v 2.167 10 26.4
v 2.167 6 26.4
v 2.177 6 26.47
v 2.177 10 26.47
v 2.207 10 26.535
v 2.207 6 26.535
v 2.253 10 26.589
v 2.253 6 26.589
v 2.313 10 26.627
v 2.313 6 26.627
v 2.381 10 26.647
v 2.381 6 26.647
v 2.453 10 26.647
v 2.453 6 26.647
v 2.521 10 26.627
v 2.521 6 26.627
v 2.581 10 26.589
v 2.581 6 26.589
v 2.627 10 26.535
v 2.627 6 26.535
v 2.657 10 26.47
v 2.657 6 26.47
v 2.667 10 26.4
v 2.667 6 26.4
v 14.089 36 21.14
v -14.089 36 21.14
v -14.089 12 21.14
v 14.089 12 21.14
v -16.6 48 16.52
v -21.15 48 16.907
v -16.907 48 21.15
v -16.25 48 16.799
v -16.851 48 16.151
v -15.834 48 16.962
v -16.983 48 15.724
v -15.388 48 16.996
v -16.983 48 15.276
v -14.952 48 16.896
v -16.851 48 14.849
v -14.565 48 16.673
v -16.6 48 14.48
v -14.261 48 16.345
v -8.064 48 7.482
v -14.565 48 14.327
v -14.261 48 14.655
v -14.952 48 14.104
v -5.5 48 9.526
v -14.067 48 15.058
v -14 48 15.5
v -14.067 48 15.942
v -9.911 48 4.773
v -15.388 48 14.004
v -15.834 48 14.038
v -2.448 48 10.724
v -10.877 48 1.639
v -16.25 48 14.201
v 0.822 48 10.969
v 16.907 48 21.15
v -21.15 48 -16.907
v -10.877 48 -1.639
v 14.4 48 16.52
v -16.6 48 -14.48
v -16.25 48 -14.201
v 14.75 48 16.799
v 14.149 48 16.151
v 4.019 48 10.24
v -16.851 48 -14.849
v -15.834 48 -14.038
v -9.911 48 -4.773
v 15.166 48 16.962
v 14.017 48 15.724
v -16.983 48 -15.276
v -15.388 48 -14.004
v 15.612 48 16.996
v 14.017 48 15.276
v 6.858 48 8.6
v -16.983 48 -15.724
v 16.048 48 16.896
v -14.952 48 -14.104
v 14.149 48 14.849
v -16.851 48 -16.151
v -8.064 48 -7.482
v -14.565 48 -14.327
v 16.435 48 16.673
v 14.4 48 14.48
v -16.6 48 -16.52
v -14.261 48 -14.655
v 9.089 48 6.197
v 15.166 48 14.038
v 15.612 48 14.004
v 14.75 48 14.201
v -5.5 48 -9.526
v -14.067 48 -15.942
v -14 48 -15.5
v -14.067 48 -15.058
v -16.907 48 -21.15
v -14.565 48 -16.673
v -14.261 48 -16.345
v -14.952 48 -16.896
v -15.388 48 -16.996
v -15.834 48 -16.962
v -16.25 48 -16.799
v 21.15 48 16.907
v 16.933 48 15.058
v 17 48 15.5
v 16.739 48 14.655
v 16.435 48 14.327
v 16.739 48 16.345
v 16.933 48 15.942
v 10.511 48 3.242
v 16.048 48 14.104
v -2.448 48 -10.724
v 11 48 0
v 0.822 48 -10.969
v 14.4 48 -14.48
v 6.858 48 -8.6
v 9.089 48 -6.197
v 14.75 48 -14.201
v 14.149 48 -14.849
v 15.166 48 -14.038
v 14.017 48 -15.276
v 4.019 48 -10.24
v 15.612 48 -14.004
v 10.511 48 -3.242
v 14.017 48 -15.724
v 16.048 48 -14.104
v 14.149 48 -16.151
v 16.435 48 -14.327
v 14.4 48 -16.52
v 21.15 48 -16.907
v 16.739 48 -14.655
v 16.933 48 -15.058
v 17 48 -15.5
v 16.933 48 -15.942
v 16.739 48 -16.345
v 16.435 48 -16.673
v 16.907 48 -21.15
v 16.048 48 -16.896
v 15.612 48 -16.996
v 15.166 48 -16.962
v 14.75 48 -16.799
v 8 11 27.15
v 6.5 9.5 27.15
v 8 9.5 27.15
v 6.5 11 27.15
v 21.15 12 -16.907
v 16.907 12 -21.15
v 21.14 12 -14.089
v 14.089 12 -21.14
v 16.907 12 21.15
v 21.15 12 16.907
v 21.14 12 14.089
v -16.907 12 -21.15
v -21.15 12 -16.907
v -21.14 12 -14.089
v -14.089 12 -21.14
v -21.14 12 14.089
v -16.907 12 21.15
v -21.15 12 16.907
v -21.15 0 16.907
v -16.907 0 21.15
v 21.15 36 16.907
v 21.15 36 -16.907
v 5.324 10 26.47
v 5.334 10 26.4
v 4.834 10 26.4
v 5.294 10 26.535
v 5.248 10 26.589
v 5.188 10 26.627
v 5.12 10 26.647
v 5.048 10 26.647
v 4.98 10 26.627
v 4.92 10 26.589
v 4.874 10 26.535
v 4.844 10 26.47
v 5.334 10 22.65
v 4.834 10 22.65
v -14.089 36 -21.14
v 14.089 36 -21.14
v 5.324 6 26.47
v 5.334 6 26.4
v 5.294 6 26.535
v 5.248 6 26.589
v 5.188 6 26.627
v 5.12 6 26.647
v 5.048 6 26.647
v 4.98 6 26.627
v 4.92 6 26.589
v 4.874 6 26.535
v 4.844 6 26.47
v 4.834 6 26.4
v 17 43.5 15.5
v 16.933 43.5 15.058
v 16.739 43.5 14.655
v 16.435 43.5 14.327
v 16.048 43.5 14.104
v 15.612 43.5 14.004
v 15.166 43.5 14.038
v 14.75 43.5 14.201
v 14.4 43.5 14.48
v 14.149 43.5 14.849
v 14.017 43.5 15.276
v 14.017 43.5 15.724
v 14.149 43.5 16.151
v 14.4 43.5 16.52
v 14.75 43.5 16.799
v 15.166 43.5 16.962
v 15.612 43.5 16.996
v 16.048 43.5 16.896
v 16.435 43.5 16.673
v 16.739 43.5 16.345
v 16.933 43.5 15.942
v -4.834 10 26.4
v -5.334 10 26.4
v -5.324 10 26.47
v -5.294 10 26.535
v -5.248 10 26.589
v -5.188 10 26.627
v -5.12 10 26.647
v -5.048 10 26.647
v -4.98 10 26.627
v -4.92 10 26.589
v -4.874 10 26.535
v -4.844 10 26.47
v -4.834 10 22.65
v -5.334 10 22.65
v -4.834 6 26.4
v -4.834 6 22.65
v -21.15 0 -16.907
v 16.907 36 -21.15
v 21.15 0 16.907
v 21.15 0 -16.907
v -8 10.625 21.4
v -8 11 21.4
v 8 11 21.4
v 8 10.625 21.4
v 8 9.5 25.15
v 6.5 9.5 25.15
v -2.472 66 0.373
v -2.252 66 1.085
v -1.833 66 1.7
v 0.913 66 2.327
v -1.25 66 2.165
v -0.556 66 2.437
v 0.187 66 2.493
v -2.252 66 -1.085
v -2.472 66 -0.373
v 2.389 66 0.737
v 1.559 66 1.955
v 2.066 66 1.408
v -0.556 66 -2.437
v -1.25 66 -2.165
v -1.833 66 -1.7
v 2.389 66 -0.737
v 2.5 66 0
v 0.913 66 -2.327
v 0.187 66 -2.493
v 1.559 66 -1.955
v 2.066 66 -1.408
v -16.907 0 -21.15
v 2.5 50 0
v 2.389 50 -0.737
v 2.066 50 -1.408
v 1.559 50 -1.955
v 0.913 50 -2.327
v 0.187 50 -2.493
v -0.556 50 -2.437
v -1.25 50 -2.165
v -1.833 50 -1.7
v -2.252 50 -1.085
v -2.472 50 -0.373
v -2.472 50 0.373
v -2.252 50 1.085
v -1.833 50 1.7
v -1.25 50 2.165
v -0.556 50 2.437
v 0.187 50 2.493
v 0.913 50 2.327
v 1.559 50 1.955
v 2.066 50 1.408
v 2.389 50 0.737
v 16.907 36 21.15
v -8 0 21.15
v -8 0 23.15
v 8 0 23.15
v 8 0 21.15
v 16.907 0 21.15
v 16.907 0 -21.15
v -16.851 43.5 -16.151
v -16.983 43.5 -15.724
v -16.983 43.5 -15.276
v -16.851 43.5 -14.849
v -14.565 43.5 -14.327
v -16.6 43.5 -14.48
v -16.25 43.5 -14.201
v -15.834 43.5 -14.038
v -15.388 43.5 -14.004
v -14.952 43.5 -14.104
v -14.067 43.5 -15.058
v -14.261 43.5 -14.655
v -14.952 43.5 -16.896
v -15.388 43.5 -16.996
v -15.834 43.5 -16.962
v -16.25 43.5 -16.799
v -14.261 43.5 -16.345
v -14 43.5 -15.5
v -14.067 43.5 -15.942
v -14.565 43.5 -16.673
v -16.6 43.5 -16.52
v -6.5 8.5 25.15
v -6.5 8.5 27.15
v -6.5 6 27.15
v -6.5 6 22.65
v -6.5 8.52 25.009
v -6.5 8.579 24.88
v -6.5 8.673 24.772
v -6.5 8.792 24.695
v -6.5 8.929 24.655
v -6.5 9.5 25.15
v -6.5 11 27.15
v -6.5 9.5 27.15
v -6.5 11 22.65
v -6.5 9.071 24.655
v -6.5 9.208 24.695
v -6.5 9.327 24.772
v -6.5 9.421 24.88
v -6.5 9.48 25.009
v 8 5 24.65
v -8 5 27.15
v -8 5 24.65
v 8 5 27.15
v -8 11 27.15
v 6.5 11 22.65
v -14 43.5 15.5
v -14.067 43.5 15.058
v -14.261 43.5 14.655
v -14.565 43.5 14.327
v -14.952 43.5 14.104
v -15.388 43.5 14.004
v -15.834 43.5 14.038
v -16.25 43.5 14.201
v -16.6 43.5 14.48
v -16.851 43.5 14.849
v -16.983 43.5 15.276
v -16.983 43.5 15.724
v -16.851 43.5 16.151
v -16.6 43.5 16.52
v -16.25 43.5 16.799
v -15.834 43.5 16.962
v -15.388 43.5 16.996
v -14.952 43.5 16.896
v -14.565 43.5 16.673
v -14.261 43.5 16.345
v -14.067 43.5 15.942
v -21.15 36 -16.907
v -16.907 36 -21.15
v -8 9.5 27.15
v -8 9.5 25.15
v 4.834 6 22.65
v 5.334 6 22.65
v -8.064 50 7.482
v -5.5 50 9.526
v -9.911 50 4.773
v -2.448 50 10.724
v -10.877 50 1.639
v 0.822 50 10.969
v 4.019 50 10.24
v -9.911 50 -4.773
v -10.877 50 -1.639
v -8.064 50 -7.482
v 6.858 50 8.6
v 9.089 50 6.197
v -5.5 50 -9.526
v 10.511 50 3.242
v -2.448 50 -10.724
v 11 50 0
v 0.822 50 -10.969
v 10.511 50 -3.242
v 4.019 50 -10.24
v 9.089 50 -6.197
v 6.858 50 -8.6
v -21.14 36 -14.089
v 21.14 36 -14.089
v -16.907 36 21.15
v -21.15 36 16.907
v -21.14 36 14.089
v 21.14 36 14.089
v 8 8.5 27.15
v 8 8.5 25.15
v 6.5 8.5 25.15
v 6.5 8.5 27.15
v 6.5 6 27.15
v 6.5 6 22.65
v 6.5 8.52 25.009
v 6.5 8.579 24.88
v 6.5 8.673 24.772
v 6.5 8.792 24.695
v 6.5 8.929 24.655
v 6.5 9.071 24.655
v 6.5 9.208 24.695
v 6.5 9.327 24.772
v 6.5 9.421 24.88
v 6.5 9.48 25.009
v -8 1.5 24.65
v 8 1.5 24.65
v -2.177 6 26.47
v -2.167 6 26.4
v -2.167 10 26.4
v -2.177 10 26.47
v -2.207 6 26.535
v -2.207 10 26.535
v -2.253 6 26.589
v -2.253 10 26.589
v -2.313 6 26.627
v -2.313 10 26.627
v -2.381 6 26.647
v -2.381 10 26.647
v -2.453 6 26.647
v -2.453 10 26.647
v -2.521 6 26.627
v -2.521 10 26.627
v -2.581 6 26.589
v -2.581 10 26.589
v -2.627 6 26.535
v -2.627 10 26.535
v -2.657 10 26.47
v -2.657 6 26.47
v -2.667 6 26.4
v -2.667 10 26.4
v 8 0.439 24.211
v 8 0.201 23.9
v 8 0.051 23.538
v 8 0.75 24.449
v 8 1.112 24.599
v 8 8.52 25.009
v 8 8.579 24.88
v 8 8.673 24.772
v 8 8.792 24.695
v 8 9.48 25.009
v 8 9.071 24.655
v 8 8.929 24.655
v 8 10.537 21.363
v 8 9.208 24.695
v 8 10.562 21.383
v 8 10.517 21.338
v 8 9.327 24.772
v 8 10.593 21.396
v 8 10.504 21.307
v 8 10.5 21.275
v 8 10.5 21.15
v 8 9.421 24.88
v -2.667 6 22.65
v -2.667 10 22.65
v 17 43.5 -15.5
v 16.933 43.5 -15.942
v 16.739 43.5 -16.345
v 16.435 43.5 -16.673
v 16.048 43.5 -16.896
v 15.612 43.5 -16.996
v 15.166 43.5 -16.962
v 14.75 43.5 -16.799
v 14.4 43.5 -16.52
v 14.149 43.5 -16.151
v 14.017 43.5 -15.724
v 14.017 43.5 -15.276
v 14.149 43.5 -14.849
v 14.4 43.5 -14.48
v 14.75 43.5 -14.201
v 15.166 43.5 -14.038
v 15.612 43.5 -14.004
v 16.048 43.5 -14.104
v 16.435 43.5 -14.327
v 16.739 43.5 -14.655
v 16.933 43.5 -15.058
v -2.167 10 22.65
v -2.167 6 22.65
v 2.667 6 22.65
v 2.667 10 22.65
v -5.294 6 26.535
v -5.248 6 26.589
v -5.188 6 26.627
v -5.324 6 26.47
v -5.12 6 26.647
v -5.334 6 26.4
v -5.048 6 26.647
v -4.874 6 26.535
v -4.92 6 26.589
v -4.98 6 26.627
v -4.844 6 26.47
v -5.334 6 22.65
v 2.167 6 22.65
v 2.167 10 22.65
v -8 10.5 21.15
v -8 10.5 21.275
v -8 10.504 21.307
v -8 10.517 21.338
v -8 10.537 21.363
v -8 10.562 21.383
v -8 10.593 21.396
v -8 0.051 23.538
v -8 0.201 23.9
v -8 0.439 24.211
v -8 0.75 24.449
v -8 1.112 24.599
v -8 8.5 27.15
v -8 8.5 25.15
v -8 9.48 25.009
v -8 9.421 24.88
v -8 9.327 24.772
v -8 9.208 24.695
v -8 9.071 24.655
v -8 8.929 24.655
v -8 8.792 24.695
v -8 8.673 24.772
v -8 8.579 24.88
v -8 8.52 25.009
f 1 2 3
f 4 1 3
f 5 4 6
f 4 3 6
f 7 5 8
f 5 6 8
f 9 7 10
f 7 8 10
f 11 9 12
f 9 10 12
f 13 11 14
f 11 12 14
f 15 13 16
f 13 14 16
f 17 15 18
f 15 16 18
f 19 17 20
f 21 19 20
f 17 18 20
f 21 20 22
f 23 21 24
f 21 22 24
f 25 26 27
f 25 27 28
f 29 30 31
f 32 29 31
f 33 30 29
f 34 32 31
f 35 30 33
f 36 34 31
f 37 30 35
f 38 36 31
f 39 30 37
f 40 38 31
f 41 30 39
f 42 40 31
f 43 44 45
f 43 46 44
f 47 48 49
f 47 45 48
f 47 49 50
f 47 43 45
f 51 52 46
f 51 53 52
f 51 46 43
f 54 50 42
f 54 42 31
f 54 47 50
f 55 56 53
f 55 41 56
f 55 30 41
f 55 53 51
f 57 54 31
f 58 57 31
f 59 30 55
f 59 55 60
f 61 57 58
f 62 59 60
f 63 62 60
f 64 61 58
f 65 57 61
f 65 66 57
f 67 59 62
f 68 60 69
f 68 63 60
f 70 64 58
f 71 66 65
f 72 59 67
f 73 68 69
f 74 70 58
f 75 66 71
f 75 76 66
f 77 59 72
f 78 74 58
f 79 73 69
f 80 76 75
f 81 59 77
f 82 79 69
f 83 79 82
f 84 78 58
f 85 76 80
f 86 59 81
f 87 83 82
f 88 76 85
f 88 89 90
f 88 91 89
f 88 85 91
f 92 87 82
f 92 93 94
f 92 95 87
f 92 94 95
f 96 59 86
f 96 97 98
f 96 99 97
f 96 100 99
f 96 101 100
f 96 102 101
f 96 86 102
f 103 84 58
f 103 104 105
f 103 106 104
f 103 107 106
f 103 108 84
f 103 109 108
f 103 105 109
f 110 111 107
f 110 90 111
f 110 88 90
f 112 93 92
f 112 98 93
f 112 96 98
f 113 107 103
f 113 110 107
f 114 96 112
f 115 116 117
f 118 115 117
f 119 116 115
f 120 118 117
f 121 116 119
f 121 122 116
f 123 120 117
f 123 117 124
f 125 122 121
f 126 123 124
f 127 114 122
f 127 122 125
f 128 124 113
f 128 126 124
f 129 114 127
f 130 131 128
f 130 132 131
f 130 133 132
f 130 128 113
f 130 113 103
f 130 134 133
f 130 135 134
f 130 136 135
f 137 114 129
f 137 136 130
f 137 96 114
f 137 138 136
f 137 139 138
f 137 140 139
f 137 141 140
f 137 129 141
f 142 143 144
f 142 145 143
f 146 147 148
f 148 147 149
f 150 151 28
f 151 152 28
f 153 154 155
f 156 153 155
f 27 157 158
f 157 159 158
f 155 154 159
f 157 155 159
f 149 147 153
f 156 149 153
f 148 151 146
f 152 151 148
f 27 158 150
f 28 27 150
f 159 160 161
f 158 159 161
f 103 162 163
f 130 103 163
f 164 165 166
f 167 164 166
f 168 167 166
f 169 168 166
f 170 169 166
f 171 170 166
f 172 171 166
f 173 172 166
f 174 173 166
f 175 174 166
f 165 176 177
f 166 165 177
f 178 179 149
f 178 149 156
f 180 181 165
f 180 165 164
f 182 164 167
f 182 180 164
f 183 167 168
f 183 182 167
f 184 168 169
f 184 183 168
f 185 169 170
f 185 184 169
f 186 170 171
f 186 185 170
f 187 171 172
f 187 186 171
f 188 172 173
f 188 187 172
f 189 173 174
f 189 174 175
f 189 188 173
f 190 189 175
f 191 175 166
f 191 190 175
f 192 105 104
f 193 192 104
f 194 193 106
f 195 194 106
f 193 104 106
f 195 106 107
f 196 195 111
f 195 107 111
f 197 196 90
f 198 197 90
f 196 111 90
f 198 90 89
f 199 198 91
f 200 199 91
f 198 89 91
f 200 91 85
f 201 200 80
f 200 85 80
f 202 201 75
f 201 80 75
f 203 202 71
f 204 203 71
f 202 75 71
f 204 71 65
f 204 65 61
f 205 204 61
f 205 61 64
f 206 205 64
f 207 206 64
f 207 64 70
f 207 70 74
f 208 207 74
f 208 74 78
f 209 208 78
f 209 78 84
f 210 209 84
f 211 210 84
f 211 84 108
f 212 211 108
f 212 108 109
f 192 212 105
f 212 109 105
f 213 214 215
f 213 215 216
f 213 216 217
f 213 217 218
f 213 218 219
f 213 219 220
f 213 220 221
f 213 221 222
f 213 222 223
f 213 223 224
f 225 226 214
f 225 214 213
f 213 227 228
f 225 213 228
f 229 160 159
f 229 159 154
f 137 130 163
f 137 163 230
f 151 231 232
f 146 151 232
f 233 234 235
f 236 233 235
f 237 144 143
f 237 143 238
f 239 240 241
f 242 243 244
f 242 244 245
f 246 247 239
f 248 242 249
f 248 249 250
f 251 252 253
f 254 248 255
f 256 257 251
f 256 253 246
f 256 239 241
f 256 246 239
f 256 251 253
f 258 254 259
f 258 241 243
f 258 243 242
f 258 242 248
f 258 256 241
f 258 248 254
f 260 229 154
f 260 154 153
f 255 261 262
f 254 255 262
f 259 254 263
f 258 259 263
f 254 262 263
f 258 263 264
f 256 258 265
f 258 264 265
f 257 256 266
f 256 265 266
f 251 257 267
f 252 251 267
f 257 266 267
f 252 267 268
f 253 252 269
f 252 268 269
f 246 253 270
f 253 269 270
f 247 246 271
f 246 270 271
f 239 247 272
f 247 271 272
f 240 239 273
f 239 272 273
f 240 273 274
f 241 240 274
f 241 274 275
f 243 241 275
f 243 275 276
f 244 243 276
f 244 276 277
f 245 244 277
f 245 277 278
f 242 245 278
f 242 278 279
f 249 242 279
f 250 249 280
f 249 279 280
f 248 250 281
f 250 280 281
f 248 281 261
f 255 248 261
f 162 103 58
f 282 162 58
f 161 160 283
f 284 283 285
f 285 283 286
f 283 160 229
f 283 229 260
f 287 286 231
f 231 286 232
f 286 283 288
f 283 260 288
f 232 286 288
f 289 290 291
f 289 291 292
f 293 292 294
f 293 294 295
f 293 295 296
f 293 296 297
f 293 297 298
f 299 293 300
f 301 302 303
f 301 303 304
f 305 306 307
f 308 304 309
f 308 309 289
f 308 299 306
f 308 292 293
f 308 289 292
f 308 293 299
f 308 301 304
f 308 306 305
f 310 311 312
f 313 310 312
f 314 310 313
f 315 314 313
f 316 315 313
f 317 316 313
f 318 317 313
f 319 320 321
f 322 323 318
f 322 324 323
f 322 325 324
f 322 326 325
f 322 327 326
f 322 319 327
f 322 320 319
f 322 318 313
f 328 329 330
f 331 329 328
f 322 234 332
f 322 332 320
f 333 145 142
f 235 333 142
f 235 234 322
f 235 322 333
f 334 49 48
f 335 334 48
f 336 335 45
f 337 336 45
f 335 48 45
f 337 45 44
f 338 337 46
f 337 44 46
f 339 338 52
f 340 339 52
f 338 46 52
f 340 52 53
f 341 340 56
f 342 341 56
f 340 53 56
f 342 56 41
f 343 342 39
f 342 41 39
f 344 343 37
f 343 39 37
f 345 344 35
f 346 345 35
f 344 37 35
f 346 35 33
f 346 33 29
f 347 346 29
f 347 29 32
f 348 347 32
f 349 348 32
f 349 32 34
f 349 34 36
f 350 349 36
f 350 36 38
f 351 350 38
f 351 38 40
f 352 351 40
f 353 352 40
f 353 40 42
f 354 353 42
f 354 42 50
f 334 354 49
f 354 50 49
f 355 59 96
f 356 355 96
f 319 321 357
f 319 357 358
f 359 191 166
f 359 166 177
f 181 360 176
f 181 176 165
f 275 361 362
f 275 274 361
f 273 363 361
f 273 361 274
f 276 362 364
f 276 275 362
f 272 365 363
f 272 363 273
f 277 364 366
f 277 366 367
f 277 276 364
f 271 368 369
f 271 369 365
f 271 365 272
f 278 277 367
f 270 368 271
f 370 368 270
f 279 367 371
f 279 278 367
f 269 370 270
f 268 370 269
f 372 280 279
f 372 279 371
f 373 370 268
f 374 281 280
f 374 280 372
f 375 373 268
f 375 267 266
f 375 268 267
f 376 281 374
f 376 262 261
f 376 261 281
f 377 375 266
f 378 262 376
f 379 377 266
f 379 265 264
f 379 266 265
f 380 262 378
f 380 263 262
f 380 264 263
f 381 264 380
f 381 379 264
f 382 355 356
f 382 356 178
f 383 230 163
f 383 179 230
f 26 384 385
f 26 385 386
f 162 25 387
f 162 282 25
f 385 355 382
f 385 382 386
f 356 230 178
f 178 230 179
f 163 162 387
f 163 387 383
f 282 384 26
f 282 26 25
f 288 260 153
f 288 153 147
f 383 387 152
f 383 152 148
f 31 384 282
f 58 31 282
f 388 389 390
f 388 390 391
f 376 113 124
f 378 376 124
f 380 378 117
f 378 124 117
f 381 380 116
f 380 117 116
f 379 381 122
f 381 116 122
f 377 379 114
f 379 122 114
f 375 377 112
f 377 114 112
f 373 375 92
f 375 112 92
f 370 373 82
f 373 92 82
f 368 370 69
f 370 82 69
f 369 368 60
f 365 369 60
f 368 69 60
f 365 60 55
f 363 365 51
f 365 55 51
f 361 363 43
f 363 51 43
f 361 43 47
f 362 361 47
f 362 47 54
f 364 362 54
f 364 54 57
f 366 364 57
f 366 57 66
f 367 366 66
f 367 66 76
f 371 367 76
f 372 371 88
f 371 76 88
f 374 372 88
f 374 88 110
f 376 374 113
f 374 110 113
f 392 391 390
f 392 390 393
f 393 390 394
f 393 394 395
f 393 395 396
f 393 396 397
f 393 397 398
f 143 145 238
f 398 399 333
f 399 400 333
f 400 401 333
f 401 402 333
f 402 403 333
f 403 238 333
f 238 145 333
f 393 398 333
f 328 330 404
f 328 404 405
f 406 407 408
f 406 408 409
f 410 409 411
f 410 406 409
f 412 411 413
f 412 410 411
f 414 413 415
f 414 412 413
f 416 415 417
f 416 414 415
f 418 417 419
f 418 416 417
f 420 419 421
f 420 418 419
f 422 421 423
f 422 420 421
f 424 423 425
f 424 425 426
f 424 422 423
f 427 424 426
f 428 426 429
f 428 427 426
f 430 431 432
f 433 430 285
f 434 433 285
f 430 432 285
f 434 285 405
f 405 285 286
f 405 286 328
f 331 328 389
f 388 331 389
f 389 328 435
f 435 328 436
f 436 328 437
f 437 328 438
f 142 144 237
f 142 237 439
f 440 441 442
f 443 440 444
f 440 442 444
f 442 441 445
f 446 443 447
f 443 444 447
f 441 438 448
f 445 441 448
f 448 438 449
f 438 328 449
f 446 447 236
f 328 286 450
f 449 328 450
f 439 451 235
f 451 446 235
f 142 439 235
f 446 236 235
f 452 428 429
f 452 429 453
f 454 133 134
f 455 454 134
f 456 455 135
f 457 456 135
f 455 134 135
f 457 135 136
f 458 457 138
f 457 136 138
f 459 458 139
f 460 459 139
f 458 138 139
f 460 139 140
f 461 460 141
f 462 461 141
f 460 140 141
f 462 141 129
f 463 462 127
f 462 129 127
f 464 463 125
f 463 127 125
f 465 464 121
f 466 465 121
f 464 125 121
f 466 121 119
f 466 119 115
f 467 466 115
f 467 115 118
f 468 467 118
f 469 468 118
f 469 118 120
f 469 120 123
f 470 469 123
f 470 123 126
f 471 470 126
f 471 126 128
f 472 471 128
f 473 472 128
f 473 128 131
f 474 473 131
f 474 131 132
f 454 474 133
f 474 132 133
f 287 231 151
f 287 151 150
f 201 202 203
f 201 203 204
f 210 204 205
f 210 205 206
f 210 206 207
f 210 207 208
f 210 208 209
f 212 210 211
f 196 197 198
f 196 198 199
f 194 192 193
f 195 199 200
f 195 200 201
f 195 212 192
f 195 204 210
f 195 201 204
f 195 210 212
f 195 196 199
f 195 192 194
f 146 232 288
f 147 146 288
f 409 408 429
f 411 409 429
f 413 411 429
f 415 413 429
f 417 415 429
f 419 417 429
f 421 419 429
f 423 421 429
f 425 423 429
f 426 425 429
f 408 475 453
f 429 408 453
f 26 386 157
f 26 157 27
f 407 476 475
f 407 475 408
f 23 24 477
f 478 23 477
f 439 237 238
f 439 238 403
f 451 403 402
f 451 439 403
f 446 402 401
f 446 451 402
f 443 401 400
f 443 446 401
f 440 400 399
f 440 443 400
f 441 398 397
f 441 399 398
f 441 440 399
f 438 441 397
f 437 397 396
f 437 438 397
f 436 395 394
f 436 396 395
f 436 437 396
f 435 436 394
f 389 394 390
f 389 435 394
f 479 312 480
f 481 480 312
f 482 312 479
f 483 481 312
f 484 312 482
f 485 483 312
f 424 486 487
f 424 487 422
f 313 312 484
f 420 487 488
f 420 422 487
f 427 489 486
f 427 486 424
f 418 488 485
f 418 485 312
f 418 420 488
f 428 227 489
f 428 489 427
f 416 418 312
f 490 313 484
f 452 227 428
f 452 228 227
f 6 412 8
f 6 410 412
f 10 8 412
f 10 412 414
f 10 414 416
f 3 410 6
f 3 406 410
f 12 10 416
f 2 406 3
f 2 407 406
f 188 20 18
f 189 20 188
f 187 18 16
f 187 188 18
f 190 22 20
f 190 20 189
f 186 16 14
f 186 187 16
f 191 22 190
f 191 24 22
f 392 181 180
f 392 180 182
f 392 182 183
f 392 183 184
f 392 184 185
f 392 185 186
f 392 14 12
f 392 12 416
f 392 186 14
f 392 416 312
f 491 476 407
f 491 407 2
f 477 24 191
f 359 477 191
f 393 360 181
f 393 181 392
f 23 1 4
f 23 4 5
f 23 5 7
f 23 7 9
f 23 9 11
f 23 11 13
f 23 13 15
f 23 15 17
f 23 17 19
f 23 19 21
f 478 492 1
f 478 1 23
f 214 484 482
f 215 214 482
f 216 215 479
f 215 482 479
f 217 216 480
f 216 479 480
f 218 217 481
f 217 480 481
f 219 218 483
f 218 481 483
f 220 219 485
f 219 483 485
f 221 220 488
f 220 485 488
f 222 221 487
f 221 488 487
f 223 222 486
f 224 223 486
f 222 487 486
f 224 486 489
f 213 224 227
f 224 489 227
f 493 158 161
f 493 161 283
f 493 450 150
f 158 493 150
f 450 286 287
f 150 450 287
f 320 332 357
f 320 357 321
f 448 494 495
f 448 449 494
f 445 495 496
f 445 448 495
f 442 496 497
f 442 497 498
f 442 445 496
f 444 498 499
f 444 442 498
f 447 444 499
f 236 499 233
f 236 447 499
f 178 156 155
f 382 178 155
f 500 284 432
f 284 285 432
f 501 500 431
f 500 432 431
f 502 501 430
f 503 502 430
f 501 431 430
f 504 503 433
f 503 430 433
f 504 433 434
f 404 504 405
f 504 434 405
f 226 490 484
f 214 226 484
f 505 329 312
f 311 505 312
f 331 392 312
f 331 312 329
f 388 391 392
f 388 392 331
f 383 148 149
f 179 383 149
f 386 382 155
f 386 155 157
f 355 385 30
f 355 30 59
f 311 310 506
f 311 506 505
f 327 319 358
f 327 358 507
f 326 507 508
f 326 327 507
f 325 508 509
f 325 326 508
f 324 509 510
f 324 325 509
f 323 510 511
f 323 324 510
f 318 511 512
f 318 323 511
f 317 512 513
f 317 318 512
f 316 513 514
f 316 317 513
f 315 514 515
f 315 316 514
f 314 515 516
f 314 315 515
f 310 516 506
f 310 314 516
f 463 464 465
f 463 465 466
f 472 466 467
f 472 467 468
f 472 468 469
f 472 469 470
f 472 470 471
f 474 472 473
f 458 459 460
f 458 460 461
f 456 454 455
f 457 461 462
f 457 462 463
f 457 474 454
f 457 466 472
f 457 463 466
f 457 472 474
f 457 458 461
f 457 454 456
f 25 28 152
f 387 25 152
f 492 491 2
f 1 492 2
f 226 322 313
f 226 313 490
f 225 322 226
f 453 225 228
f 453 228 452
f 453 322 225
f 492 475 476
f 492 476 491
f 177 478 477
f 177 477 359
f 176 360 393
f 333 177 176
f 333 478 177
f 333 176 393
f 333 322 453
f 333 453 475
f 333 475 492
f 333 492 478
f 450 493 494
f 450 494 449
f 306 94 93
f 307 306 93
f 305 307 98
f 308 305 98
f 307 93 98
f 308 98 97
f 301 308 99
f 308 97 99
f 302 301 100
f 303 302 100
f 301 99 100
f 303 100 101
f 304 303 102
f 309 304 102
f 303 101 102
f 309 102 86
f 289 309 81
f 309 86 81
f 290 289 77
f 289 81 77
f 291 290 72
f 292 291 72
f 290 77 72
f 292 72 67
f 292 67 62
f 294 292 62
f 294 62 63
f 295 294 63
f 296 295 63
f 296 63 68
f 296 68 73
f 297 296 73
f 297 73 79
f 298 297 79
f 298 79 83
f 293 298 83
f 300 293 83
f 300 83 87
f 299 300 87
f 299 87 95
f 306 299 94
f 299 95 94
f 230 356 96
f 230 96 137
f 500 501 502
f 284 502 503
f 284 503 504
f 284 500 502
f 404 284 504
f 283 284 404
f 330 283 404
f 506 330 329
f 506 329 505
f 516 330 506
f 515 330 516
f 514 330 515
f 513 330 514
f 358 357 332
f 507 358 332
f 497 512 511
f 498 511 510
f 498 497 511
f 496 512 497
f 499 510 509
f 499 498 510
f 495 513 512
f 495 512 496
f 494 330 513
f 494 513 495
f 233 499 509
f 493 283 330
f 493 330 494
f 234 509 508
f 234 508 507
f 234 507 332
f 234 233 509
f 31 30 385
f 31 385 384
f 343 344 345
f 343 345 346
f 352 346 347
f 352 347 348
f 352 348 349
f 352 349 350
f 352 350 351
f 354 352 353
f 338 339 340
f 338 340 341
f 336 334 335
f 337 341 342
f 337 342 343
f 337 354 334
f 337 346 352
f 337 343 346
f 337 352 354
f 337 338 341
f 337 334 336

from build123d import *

# Parameters (mm, degrees)
SKETCH1_W               = 42.3
SKETCH1_H               = 42.3
BOSS_EXTRUDE1_DEPTH     = 48
SKETCH2_R               = 11
BOSS_EXTRUDE2_DEPTH     = 2
SKETCH3_R               = 2.5
BOSS_EXTRUDE3_DEPTH     = 16
CUT_EXTRUDE1_DEPTH      = 19
CUT_EXTRUDE1_DEPTH_BACK = 49
SKETCH5_W               = 33.814718626
SKETCH5_H               = 24
CUT_EXTRUDE2_DEPTH      = 0.01
CUT_EXTRUDE3_START      = -12
CUT_EXTRUDE3_DEPTH      = 24
CIRPATTERN1_COUNT       = 4
SKETCH7_R               = 1.5
CUT_EXTRUDE4_DEPTH      = 4.5
SKETCH8_W               = 16
SKETCH8_H               = 11
BOSS_EXTRUDE4_DEPTH     = 6
SKETCH9_W               = 16
SKETCH9_H               = 5
CUT_EXTRUDE5_DEPTH      = 2.5
FILLET1_R               = 1.5
SKETCH10_W              = 13
SKETCH10_H              = 4.5
CUT_EXTRUDE6_DEPTH      = 5
CUT_EXTRUDE7_DEPTH      = 30.15
BOSS_EXTRUDE5_DEPTH     = 4
SKETCH13_W              = 16
SKETCH13_H              = 0.25
CUT_EXTRUDE8_DEPTH      = 0.5
FILLET2_R               = 0.125


with BuildPart() as part:
    # Sketch1 → Boss-Extrude1 (new body)
    with BuildSketch(Plane(origin=(0, 0, 0), x_dir=(1, 0, 0), z_dir=(0, 1, 0))):
        Rectangle(SKETCH1_W, SKETCH1_H)
    extrude(amount=BOSS_EXTRUDE1_DEPTH)

    # Sketch2 → Boss-Extrude2 (add)
    with BuildSketch(Plane(origin=(0, 48, 0), x_dir=(1, 0, 0), z_dir=(0, 1, 0))):
        Circle(SKETCH2_R)
    extrude(amount=BOSS_EXTRUDE2_DEPTH)

    # Sketch3 → Boss-Extrude3 (add)
    with BuildSketch(Plane(origin=(0, 50, 0), x_dir=(1, 0, 0), z_dir=(0, 1, 0))):
        Circle(SKETCH3_R)
    extrude(amount=BOSS_EXTRUDE3_DEPTH)

    # Sketch4 → Cut-Extrude1 (cut, two sides)
    with BuildSketch(Plane(origin=(0, 48, 0), x_dir=(1, 0, 0), z_dir=(0, 1, 0))) as cut_extrude1_sk:
        Polygon((-21.15, 16.907359313), (-16.907359313, 21.15), (-21.15, 21.15), align=None)
        Polygon((21.15, 21.15), (21.15, 16.907359313), (16.907359313, 21.15), align=None)
        Polygon((21.15, -16.907359313), (16.907359313, -21.15), (21.15, -21.15), align=None)
        Polygon((-21.15, -21.15), (-21.15, -16.907359313), (-16.907359313, -21.15), align=None)
    extrude(amount=CUT_EXTRUDE1_DEPTH, mode=Mode.SUBTRACT)
    extrude(cut_extrude1_sk.sketch, amount=-CUT_EXTRUDE1_DEPTH_BACK, mode=Mode.SUBTRACT)

    # Sketch5 → Cut-Extrude2 (cut)
    with BuildSketch(Plane(origin=(21.15, 0, 0), x_dir=(0, 0, -1), z_dir=(1, 0, 0))):
        with Locations((0, 24)):
            Rectangle(SKETCH5_W, SKETCH5_H)
    cut_extrude2 = extrude(amount=-CUT_EXTRUDE2_DEPTH, mode=Mode.SUBTRACT)

    # Sketch6 → Cut-Extrude3 (cut)
    with BuildSketch(Plane(origin=(0, 48, 0), x_dir=(1, 0, 0), z_dir=(0, 1, 0)).offset(CUT_EXTRUDE3_START)):
        Polygon((21.15, 14.078932188), (14.078932188, 21.15), (21.15, 21.15), align=None)
    cut_extrude3 = extrude(amount=-CUT_EXTRUDE3_DEPTH, mode=Mode.SUBTRACT)

    # CirPattern1: Cut-Extrude2, Cut-Extrude3 ×4 about axis
    cirpattern1_axis = Axis((0, 0, 0), (0, 1, 0))
    for i in range(1, CIRPATTERN1_COUNT):
        add(cut_extrude2.rotate(cirpattern1_axis, i * 360 / CIRPATTERN1_COUNT), mode=Mode.SUBTRACT)
        add(cut_extrude3.rotate(cirpattern1_axis, i * 360 / CIRPATTERN1_COUNT), mode=Mode.SUBTRACT)

    # Sketch7 → Cut-Extrude4 (cut)
    with BuildSketch(Plane(origin=(0, 48, 0), x_dir=(1, 0, 0), z_dir=(0, 1, 0))):
        with Locations((15.5, 15.5)):
            Circle(SKETCH7_R)
        with Locations((15.5, -15.5)):
            Circle(SKETCH7_R)
        with Locations((-15.5, -15.5)):
            Circle(SKETCH7_R)
        with Locations((-15.5, 15.5)):
            Circle(SKETCH7_R)
    extrude(amount=-CUT_EXTRUDE4_DEPTH, mode=Mode.SUBTRACT)

    # Sketch8 → Boss-Extrude4 (add)
    with BuildSketch(Plane.XY.offset(21.15)):
        with Locations((0, 5.5)):
            Rectangle(SKETCH8_W, SKETCH8_H)
    extrude(amount=BOSS_EXTRUDE4_DEPTH)

    # Sketch9 → Cut-Extrude5 (cut)
    with BuildSketch(Plane.XY.offset(27.15)):
        with Locations((0, 2.5)):
            Rectangle(SKETCH9_W, SKETCH9_H)
    extrude(amount=-CUT_EXTRUDE5_DEPTH, mode=Mode.SUBTRACT)

    # Fillet1
    fillet1_edges = [part.edges().sort_by_distance(p)[0] for p in [
        (0, 0, 24.65),
    ]]
    fillet(fillet1_edges, radius=FILLET1_R)

    # Sketch10 → Cut-Extrude6 (cut)
    with BuildSketch(Plane(origin=(0, 11, 0), x_dir=(1, 0, 0), z_dir=(0, 1, 0))):
        with Locations((0, -24.9)):
            Rectangle(SKETCH10_W, SKETCH10_H)
    extrude(amount=-CUT_EXTRUDE6_DEPTH, mode=Mode.SUBTRACT)

    # Sketch11 → Cut-Extrude7 (cut, through all)
    with BuildSketch(Plane(origin=(8, 0, 0), x_dir=(0, 0, -1), z_dir=(1, 0, 0))):
        with BuildLine():
            Line((-27.15, 9.5), (-25.15, 9.5))
            ThreePointArc((-25.15, 9.5), (-24.65, 9), (-25.15, 8.5))
            Line((-25.15, 8.5), (-27.15, 8.5))
            Line((-27.15, 8.5), (-27.15, 9.5))
        make_face()
    extrude(amount=-CUT_EXTRUDE7_DEPTH, mode=Mode.SUBTRACT)

    # Sketch12 → Boss-Extrude5 (add)
    with BuildSketch(Plane(origin=(0, 6, 0), x_dir=(1, 0, 0), z_dir=(0, 1, 0))):
        with BuildLine():
            Line((-2.667, -22.65), (-2.167, -22.65))
            Line((-2.167, -22.65), (-2.167, -26.4))
            ThreePointArc((-2.167, -26.4), (-2.417, -26.65), (-2.667, -26.4))
            Line((-2.667, -26.4), (-2.667, -22.65))
        make_face()
        with BuildLine():
            Line((5.334, -22.65), (5.334, -26.4))
            ThreePointArc((5.334, -26.4), (5.084, -26.65), (4.834, -26.4))
            Line((4.834, -26.4), (4.834, -22.65))
            Line((4.834, -22.65), (5.334, -22.65))
        make_face()
        with BuildLine():
            Line((-4.834, -22.65), (-5.334, -22.65))
            Line((-5.334, -22.65), (-5.334, -26.4))
            ThreePointArc((-5.334, -26.4), (-5.084, -26.65), (-4.834, -26.4))
            Line((-4.834, -26.4), (-4.834, -22.65))
        make_face()
        with BuildLine():
            Line((2.167, -22.65), (2.167, -26.4))
            ThreePointArc((2.167, -26.4), (2.417, -26.65), (2.667, -26.4))
            Line((2.667, -26.4), (2.667, -22.65))
            Line((2.667, -22.65), (2.167, -22.65))
        make_face()
    extrude(amount=BOSS_EXTRUDE5_DEPTH)

    # Sketch13 → Cut-Extrude8 (cut)
    with BuildSketch(Plane(origin=(0, 11, 0), x_dir=(1, 0, 0), z_dir=(0, 1, 0))):
        with Locations((0, -21.275)):
            Rectangle(SKETCH13_W, SKETCH13_H)
    extrude(amount=-CUT_EXTRUDE8_DEPTH, mode=Mode.SUBTRACT)

    # Fillet2
    fillet2_edges = [part.edges().sort_by_distance(p)[0] for p in [
        (0, 10.5, 21.4),
    ]]
    fillet(fillet2_edges, radius=FILLET2_R)


solid = part.part
